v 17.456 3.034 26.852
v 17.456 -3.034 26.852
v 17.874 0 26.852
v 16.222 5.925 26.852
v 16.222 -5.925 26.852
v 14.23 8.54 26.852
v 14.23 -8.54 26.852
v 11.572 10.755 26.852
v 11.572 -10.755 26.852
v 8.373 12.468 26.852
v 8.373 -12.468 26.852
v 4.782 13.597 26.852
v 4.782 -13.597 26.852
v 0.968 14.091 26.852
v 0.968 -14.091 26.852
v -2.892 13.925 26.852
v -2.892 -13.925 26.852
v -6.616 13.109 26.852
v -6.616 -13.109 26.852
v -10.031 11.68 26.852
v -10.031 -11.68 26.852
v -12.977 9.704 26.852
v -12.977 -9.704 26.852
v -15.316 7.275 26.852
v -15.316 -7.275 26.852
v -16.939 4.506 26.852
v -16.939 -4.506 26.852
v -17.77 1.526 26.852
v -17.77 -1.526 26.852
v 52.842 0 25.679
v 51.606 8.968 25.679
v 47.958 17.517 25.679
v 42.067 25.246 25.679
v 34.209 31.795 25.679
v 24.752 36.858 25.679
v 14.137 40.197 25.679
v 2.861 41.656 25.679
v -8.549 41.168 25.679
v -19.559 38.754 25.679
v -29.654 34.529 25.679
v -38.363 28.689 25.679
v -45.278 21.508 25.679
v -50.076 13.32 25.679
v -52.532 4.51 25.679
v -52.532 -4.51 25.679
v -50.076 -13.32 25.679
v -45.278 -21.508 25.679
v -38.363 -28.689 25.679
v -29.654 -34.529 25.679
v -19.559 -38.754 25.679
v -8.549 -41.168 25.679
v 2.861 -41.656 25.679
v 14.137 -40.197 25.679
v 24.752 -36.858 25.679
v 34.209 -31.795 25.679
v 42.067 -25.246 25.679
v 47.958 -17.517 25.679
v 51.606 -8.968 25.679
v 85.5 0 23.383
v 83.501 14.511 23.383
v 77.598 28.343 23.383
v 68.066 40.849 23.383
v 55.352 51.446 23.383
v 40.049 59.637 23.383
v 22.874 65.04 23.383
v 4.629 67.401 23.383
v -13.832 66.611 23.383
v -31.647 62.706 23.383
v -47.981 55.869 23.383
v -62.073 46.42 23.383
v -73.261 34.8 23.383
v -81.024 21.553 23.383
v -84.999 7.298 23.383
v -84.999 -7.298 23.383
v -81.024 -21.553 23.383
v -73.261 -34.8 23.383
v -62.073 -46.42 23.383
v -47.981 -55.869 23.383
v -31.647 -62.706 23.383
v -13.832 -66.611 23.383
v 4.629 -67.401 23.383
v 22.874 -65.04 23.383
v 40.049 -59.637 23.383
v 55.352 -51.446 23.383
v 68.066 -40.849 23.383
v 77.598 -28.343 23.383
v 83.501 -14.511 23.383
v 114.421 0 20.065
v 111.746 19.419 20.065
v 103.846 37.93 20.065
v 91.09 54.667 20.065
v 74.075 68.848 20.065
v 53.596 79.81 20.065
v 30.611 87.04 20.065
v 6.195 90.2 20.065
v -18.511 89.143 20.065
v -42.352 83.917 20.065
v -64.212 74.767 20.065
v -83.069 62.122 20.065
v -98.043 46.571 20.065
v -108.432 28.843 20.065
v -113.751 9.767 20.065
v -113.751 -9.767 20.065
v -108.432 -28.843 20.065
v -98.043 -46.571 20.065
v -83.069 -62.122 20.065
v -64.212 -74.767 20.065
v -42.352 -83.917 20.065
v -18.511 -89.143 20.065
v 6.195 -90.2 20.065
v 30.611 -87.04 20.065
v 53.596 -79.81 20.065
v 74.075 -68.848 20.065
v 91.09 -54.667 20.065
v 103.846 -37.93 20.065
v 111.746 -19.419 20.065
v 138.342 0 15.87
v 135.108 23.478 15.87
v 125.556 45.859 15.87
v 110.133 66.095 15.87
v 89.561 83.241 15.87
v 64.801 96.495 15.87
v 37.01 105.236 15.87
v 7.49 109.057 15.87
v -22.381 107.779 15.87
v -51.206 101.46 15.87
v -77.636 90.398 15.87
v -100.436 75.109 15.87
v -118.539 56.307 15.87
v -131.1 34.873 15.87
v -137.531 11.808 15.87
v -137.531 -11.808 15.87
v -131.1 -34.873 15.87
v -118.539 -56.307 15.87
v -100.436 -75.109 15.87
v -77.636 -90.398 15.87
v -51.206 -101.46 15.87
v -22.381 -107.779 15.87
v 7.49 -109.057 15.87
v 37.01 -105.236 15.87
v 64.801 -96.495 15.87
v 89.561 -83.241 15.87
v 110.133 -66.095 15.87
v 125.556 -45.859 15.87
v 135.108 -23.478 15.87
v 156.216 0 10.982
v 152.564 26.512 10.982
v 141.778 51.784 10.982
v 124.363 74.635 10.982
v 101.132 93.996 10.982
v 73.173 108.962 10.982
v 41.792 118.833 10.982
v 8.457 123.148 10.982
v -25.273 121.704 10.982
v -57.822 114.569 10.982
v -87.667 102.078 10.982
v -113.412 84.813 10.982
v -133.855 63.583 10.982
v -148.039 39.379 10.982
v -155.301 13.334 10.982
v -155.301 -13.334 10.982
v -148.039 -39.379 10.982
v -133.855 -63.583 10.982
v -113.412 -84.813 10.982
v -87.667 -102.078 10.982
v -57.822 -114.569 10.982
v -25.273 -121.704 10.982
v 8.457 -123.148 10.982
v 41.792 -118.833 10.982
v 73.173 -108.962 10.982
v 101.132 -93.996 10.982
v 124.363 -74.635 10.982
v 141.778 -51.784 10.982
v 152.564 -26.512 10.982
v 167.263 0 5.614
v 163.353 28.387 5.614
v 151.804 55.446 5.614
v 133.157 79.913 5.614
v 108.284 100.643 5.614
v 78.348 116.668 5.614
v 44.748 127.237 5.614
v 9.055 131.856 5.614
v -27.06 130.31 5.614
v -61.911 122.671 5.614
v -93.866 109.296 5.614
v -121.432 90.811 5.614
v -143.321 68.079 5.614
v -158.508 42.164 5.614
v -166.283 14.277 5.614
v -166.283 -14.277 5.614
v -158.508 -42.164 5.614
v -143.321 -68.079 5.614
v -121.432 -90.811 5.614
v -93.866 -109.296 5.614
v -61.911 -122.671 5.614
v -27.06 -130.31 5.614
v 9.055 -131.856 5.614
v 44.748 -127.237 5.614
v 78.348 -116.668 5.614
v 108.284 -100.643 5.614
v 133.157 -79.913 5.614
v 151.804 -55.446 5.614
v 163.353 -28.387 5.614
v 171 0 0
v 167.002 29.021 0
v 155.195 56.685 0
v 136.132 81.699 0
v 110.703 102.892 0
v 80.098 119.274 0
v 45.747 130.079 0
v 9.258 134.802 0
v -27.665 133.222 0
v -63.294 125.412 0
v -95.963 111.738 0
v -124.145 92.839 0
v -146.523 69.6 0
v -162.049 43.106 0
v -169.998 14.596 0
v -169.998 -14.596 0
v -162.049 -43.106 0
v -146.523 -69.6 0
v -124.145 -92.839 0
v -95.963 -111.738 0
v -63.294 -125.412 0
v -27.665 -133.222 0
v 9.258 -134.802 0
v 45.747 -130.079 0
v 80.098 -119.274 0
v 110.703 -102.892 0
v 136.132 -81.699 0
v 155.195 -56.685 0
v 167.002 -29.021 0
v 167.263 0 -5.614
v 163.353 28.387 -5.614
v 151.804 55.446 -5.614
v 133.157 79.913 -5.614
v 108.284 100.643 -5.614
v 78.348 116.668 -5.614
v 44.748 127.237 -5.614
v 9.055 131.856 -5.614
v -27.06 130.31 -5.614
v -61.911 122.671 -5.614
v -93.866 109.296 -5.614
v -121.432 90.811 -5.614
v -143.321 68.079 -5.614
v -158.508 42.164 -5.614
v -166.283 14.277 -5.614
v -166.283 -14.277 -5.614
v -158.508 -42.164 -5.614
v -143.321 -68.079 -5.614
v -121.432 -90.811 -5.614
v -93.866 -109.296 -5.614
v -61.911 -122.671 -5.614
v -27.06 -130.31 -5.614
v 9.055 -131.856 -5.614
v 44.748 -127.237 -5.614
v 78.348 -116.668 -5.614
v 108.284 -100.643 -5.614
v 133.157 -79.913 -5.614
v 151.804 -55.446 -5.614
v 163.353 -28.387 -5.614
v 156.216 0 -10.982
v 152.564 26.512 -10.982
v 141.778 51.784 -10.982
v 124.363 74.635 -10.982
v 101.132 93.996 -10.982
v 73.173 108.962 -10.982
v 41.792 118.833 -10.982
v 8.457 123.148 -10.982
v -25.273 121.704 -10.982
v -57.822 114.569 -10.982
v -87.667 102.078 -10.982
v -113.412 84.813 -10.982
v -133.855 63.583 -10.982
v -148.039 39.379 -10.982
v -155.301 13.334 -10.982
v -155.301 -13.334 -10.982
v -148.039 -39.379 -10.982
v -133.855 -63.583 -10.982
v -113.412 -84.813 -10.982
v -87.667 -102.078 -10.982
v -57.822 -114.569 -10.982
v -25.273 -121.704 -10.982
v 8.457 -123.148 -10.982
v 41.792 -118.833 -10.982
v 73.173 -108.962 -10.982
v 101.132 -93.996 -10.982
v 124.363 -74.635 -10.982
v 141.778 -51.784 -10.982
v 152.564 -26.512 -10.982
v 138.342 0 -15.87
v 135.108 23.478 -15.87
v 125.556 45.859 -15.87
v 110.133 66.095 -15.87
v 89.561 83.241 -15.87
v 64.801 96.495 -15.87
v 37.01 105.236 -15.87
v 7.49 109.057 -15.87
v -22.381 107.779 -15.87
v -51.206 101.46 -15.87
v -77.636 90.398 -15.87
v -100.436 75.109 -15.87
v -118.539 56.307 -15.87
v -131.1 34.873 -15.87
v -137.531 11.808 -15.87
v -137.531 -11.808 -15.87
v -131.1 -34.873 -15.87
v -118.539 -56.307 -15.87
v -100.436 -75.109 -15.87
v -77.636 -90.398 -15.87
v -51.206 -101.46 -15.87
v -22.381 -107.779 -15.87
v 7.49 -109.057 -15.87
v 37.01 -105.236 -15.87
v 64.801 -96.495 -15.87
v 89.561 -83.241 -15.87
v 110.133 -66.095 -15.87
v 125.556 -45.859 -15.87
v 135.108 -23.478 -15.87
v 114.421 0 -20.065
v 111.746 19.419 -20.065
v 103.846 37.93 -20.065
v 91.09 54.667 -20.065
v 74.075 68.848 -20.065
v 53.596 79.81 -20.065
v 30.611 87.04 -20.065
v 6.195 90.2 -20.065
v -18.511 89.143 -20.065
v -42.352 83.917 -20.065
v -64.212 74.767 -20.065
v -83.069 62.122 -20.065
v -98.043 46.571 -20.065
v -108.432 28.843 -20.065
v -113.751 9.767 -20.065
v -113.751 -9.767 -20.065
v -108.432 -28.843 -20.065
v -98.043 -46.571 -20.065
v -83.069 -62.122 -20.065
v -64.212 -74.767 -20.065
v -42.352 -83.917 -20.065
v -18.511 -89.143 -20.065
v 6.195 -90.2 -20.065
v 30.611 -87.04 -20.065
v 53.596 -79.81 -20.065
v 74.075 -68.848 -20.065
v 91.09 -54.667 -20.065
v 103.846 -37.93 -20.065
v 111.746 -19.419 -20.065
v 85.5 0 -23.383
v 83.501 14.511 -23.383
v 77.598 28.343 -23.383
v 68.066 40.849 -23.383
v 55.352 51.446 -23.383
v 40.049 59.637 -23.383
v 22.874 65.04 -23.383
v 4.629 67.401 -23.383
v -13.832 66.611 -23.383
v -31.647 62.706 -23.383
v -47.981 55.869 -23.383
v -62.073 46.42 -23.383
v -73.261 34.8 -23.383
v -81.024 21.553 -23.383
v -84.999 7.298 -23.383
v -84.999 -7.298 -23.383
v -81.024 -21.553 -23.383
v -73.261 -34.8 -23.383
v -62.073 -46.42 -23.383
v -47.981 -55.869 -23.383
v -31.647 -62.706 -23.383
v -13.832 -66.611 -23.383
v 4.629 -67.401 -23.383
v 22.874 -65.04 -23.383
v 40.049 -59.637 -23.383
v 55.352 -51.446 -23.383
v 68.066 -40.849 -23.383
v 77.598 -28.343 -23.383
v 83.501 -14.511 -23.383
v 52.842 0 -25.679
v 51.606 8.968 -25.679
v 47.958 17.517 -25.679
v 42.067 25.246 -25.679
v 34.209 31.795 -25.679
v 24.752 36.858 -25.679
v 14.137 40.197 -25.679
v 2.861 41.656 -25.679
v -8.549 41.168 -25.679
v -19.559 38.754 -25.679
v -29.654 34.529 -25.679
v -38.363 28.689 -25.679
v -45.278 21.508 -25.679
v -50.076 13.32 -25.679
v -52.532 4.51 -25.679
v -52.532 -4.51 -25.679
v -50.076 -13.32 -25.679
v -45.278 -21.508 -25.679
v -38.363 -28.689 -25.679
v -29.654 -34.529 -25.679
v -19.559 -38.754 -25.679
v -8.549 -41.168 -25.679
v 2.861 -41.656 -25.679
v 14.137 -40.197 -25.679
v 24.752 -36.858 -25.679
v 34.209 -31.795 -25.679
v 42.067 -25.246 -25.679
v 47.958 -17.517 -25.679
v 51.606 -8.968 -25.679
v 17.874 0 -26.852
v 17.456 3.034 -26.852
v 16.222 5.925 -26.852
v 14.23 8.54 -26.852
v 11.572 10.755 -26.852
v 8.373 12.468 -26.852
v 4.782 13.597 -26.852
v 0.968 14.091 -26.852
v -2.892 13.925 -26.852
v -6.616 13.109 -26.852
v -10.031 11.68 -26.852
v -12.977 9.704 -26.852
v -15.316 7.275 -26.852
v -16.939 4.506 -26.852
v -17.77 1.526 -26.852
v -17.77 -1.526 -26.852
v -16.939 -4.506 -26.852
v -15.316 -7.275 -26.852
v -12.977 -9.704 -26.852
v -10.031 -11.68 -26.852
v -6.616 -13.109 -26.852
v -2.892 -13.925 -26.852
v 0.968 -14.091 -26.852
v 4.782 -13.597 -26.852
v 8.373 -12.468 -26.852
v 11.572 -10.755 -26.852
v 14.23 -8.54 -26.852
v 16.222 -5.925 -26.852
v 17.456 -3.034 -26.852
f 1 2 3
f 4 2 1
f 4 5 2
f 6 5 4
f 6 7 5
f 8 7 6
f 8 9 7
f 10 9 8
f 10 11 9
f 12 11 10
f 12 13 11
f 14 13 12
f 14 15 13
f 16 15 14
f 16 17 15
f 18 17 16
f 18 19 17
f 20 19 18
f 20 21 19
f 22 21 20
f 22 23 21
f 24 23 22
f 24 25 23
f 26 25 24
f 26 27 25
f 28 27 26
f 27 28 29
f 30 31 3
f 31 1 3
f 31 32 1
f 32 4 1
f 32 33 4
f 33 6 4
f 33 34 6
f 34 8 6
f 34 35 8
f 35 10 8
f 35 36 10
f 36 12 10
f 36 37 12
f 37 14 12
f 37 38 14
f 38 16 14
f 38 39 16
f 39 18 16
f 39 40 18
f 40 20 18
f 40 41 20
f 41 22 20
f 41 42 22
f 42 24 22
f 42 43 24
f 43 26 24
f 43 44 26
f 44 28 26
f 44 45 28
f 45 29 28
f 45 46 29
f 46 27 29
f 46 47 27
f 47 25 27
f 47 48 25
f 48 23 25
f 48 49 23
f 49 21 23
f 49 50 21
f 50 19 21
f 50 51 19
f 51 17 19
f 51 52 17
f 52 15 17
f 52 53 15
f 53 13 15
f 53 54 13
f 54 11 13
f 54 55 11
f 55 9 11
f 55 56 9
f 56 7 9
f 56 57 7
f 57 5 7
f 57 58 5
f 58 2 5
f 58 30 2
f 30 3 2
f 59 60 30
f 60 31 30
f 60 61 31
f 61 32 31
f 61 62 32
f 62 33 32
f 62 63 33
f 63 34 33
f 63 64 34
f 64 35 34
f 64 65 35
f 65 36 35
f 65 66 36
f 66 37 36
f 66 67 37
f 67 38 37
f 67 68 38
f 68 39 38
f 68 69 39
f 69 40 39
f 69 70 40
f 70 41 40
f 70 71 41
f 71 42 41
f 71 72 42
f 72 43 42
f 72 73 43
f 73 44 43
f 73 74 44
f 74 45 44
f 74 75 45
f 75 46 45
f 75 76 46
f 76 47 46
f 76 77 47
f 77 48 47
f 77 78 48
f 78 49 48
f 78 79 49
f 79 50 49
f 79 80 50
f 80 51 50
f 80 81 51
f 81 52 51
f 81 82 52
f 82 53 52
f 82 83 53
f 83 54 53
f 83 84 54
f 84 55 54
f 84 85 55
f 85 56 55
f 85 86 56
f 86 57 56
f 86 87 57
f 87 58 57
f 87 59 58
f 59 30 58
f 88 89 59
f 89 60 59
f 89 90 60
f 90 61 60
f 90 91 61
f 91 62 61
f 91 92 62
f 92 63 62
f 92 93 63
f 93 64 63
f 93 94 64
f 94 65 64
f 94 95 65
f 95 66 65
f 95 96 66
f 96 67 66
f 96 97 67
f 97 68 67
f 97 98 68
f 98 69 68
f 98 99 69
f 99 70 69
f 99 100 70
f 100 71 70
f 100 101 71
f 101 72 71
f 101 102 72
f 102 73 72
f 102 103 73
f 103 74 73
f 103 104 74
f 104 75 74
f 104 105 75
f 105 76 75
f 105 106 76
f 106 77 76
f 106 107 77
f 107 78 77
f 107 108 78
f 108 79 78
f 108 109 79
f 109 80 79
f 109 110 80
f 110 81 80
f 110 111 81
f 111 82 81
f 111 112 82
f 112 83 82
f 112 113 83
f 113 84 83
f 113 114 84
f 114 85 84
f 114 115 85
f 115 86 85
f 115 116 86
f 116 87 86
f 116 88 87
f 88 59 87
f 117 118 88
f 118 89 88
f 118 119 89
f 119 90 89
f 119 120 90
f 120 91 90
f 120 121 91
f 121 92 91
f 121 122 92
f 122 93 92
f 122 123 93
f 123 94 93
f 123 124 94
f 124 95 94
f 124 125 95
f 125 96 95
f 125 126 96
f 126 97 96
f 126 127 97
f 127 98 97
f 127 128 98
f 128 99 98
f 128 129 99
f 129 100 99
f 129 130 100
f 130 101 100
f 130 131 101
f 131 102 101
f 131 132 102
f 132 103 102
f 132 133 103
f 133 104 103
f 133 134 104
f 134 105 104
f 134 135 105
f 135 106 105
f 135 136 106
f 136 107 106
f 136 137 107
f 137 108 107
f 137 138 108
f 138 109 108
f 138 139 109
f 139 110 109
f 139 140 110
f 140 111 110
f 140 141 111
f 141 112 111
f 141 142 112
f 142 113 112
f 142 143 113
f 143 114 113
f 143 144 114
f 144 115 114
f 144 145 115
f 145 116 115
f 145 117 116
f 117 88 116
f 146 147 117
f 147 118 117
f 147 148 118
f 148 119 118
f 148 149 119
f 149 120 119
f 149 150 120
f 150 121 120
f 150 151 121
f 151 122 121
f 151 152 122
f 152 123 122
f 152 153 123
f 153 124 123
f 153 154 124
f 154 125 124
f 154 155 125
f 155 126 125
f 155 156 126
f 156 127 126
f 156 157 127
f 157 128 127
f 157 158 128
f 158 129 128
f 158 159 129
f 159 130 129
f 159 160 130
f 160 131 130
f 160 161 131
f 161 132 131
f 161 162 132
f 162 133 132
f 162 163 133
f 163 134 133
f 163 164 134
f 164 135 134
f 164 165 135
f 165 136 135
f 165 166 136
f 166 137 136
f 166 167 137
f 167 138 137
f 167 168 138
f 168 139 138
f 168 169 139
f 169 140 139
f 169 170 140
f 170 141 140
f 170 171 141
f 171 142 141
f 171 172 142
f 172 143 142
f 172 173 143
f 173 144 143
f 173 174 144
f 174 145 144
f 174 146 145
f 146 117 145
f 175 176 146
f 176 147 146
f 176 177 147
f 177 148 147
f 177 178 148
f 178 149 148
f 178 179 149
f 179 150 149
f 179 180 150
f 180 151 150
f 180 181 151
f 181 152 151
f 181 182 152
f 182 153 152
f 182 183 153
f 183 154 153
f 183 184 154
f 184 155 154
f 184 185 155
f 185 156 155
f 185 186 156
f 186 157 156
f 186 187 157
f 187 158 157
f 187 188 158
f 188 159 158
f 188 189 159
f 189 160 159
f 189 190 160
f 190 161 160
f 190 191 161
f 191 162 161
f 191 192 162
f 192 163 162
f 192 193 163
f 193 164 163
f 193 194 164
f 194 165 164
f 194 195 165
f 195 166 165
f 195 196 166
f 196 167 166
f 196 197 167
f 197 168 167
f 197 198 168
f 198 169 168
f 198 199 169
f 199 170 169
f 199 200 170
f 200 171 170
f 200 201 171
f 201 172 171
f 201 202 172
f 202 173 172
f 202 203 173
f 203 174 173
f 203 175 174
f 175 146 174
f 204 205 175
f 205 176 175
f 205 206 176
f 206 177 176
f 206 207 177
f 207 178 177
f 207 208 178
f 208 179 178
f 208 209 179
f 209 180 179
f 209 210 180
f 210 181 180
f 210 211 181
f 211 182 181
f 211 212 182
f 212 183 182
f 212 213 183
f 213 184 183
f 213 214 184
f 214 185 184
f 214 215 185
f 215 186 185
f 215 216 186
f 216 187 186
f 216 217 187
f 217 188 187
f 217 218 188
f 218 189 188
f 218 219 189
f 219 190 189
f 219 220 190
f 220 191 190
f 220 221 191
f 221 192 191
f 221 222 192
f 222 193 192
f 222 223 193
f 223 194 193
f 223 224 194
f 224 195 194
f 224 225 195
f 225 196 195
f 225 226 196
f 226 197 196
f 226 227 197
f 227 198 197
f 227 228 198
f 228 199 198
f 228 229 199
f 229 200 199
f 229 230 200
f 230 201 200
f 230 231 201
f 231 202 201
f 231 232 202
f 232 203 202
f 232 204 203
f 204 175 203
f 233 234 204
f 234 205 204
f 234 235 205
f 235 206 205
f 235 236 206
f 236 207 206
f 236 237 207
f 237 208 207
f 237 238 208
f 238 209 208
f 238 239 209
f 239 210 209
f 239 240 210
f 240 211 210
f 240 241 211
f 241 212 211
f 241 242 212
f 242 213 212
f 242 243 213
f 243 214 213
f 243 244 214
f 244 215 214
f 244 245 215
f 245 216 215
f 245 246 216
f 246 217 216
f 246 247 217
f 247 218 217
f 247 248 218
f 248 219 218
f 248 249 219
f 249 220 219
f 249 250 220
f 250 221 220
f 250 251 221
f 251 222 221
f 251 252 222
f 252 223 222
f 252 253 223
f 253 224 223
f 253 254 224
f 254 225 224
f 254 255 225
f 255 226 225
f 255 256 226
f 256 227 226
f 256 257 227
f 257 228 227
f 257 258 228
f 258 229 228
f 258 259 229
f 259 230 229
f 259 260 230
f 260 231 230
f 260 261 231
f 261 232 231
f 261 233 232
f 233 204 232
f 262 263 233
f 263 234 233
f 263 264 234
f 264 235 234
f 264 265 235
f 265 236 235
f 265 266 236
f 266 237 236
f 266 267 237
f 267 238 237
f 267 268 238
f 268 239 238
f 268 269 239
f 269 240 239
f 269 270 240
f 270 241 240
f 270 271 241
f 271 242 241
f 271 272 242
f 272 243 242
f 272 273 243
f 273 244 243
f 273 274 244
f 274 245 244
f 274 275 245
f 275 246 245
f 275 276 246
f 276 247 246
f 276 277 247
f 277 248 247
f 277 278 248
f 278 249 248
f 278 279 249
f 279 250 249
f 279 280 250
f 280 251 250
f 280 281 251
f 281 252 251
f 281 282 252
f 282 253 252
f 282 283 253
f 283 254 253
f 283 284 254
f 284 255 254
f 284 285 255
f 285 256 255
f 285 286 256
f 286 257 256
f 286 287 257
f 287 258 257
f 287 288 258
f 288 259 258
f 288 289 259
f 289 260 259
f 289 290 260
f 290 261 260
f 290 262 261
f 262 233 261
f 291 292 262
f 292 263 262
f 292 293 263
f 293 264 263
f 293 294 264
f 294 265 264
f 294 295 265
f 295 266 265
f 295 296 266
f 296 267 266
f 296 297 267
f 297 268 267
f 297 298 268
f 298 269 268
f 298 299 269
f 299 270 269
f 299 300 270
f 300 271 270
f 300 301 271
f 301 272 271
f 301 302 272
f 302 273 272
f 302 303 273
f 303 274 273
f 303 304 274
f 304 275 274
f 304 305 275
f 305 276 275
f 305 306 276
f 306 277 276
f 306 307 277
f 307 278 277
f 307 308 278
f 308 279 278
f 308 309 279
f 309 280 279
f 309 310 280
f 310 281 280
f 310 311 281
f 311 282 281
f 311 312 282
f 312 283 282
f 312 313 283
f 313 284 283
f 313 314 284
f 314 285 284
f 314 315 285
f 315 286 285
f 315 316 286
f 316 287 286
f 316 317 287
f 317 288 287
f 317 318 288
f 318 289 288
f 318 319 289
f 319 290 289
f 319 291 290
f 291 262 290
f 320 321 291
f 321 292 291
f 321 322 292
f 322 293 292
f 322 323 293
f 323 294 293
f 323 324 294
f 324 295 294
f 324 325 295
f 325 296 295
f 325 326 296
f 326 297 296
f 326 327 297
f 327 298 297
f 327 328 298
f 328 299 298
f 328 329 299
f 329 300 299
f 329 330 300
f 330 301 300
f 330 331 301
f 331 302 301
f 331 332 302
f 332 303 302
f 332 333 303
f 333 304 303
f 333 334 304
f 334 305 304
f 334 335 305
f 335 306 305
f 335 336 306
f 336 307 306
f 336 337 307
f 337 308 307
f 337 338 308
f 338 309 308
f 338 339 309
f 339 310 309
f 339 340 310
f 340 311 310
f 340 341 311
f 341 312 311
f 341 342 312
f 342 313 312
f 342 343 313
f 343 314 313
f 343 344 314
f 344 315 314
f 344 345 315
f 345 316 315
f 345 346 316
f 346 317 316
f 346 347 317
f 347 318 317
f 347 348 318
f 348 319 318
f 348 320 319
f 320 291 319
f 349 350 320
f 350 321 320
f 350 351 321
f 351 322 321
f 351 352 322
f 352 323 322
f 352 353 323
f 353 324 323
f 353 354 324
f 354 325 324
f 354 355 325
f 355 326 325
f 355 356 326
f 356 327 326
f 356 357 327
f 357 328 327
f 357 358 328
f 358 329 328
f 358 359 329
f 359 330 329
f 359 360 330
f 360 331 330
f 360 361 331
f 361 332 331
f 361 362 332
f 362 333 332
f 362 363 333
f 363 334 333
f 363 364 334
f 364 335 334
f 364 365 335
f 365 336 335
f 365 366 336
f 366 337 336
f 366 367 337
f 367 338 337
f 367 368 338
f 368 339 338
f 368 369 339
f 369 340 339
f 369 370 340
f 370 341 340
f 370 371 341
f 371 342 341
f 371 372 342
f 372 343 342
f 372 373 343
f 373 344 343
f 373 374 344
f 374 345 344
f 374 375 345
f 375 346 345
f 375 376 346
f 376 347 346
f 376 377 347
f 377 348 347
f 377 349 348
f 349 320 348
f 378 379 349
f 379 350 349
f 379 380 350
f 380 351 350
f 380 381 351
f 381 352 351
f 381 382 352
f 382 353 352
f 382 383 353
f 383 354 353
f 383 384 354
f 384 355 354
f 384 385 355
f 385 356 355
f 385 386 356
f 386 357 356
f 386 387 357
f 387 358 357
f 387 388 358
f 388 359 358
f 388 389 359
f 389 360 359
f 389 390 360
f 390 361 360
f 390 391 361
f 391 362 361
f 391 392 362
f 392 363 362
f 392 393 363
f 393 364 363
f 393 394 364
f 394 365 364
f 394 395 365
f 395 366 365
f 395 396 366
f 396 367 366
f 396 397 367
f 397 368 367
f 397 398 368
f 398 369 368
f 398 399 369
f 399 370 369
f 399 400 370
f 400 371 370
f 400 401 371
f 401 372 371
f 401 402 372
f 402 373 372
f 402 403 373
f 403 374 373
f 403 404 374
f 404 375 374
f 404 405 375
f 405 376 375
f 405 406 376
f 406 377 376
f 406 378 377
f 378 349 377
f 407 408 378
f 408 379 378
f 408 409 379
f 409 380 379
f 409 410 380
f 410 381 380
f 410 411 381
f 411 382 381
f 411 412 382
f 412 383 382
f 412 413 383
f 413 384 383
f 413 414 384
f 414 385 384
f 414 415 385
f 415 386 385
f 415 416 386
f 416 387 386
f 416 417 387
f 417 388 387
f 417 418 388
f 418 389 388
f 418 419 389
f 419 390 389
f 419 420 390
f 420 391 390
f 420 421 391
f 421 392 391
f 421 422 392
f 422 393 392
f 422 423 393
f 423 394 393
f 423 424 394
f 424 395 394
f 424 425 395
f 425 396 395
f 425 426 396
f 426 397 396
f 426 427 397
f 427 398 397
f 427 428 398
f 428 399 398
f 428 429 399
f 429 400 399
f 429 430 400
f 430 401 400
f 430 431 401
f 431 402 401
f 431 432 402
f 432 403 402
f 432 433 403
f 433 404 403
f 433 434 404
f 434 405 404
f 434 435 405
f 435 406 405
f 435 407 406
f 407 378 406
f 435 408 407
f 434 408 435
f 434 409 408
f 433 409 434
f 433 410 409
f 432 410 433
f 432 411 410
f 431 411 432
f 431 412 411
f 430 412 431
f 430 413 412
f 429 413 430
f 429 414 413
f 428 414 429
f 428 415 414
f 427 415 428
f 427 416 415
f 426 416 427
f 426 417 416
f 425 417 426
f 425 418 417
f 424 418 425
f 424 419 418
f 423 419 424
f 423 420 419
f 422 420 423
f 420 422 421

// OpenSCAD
// Generated by SolidPython 1.0.1 on 2020-07-29 00:46:54


scale(v = [19, 15, 3]) {
	sphere(r = 9);
}
/***********************************************
*********      SolidPython code:      **********
************************************************
 
# import packages: SolidPython
from solid import *
from solid.utils import *
from itertools import chain, combinations, permutations


class Resize:

    def __init__(self, scad_file):
        self.scad_file = scad_file
        #self.scad_file = import_scad(scad_file)
        # cone/cylinder param:
        self.r1 = 0
        self.r2 = 0
        self.h = 0
        # rectangular prism param:
        self.w = 0
        self.l = 0
        # ellipse param:
        self.r = 0

    # import OpenScad code (file name corresponds to shape)


    # classify shape + parameters
    def assign(self, param1, param2, param3):
        if self.scad_file == 'cone.scad':
            self.r1 = param1
            self.r2 = param2
            self.h = param3
        elif self.scad_file == 'cylinder.scad':
            self.r1 = param1
            self.r2 = param2
            self.h = param3
        elif self.scad_file == 'rectangularPrism.scad':
            self.h = param1
            self.l = param2
            self.w = param3
        else:
            self.r = param1
            self.h = param2

    # resize parameters
    def iterate(self):
        x = range(3, 20, 2)
        i = 1
        if self.scad_file == 'cone.scad':
            tempList = list(permutations(x, 2))
            for temp in tempList:
                param1 = temp[0]
                param2 = temp[1]
                filepath = 'produced_scad_files/' + 'cone' + str(param1) + '_' + str(param2) + '_' + '.scad'
                scad_render_to_file(cylinder(h=param1, r1=param2, r2=0), filepath)

        elif self.scad_file == 'cylinder.scad':
            tempList = list(permutations(x, 3))
            for temp in tempList:
                param1 = temp[0]
                param2 = temp[1]
                filepath = 'produced_scad_files/' + 'cylinder' + str(param1) + '_' + str(param2) + '_' + '.scad'
                scad_render_to_file(cylinder(h=param1, r1=param2, r2=param2), filepath)

        elif self.scad_file == 'rectangularPrism.scad':
            tempList = list(permutations(x, 3))
            for temp in tempList:
                param1 = temp[0]
                param2 = temp[1]
                param3 = temp[2]
                filepath = 'produced_scad_files/' + 'rectangularPrism' + str(param1) + '_' + str(param2) + '_' + str(
                    param3) + '.scad'
                scad_render_to_file(cube(size=(param1, param2, param3)), filepath)

        elif self.scad_file == 'ellipse.scad':
            tempList = list(permutations(x, 4))
            for temp in tempList:
                param1 = temp[0]
                param2 = temp[1]
                param3 = temp[2]
                param4 = temp[3]
                filepath = 'produced_scad_files/' + 'ellipse' + str(param1) + '_' + str(param2) + '_' + str(param3) + '_' + str(param4) + '.scad'
                scad_render_to_file(scale([param1, param2, param3])(sphere(r=param4)), filepath)

    def render_to_scadfile(self):
        scad_render_to_file(scad, 'example.scad') 
 
************************************************/
